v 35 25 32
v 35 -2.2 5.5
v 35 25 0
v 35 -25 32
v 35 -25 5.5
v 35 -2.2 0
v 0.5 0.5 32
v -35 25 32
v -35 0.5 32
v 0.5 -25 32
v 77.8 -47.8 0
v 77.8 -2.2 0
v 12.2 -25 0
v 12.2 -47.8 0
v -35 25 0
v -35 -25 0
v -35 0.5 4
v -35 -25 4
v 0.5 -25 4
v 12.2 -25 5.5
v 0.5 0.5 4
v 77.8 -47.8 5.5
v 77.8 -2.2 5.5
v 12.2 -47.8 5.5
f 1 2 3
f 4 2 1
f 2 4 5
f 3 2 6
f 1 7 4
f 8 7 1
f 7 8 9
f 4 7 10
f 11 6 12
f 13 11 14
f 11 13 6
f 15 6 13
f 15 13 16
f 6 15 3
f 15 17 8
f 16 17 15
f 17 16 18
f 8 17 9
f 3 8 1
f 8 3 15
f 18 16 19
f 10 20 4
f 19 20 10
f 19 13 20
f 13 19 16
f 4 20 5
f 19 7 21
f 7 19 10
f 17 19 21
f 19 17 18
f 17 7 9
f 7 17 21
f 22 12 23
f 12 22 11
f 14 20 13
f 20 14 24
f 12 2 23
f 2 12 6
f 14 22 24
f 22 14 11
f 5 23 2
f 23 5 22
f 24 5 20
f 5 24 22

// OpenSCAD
// Two-part enclosure for a small electronics board (e.g., Arduino-based temperature logger)
// Print orientation: both parts lie flat on the bed, side by side, with a 10 mm gap.
// The lid is printed upside down so its lip forms an overhang (a solid block in this design).

// ---------------- Parameters ----------------
box_x      = 70;    // box outer length (X)
box_y      = 50;    // box outer width (Y)
box_z      = 30;    // box outer height (Z)
wall       = 2;     // box wall thickness
floor      = 2;     // box floor thickness

lip_t      = 1.5;   // lid lip thickness
lip_h      = 4;     // lid lip height (extends above the plate)
lip_x      = 65.6;  // lip outer length (X)
lip_y      = 45.6;  // lip outer width (Y)
lip_over   = 0.2;   // lip overhang into the box opening (clearance on each side)

eps        = 0.5;   // cutter overshoot past faces
gap        = 10;    // horizontal gap between the two parts

$fn = 64;

// ---------------- Model ----------------
union() {
    // Part 1: Box (open top)
    translate([-box_x/2, -box_y/2, 0])
        difference() {
            cube([box_x, box_y, floor + wall + box_z - wall]);
            // Cut out the open top, leaving the top wall intact
            translate([-box_x/2 - eps, -box_y/2 - eps, floor + wall])
                cube([box_x + 2*eps, box_y + 2*eps, box_z - wall + eps]);
        }

    // Part 2: Lid (printed upside down: plate on bed, lip on top)
    translate([box_x/2 + gap, -box_y/2, 0])
        union() {
            // Base plate
            translate([-lip_x/2, -lip_y/2, 0])
                cube([lip_x, lip_y, lip_t]);
            // Rectangular lip wall, centred on the plate
            translate([-lip_x/2, -lip_y/2, lip_t])
                cube([lip_x, lip_y, lip_h]);
        }
}
